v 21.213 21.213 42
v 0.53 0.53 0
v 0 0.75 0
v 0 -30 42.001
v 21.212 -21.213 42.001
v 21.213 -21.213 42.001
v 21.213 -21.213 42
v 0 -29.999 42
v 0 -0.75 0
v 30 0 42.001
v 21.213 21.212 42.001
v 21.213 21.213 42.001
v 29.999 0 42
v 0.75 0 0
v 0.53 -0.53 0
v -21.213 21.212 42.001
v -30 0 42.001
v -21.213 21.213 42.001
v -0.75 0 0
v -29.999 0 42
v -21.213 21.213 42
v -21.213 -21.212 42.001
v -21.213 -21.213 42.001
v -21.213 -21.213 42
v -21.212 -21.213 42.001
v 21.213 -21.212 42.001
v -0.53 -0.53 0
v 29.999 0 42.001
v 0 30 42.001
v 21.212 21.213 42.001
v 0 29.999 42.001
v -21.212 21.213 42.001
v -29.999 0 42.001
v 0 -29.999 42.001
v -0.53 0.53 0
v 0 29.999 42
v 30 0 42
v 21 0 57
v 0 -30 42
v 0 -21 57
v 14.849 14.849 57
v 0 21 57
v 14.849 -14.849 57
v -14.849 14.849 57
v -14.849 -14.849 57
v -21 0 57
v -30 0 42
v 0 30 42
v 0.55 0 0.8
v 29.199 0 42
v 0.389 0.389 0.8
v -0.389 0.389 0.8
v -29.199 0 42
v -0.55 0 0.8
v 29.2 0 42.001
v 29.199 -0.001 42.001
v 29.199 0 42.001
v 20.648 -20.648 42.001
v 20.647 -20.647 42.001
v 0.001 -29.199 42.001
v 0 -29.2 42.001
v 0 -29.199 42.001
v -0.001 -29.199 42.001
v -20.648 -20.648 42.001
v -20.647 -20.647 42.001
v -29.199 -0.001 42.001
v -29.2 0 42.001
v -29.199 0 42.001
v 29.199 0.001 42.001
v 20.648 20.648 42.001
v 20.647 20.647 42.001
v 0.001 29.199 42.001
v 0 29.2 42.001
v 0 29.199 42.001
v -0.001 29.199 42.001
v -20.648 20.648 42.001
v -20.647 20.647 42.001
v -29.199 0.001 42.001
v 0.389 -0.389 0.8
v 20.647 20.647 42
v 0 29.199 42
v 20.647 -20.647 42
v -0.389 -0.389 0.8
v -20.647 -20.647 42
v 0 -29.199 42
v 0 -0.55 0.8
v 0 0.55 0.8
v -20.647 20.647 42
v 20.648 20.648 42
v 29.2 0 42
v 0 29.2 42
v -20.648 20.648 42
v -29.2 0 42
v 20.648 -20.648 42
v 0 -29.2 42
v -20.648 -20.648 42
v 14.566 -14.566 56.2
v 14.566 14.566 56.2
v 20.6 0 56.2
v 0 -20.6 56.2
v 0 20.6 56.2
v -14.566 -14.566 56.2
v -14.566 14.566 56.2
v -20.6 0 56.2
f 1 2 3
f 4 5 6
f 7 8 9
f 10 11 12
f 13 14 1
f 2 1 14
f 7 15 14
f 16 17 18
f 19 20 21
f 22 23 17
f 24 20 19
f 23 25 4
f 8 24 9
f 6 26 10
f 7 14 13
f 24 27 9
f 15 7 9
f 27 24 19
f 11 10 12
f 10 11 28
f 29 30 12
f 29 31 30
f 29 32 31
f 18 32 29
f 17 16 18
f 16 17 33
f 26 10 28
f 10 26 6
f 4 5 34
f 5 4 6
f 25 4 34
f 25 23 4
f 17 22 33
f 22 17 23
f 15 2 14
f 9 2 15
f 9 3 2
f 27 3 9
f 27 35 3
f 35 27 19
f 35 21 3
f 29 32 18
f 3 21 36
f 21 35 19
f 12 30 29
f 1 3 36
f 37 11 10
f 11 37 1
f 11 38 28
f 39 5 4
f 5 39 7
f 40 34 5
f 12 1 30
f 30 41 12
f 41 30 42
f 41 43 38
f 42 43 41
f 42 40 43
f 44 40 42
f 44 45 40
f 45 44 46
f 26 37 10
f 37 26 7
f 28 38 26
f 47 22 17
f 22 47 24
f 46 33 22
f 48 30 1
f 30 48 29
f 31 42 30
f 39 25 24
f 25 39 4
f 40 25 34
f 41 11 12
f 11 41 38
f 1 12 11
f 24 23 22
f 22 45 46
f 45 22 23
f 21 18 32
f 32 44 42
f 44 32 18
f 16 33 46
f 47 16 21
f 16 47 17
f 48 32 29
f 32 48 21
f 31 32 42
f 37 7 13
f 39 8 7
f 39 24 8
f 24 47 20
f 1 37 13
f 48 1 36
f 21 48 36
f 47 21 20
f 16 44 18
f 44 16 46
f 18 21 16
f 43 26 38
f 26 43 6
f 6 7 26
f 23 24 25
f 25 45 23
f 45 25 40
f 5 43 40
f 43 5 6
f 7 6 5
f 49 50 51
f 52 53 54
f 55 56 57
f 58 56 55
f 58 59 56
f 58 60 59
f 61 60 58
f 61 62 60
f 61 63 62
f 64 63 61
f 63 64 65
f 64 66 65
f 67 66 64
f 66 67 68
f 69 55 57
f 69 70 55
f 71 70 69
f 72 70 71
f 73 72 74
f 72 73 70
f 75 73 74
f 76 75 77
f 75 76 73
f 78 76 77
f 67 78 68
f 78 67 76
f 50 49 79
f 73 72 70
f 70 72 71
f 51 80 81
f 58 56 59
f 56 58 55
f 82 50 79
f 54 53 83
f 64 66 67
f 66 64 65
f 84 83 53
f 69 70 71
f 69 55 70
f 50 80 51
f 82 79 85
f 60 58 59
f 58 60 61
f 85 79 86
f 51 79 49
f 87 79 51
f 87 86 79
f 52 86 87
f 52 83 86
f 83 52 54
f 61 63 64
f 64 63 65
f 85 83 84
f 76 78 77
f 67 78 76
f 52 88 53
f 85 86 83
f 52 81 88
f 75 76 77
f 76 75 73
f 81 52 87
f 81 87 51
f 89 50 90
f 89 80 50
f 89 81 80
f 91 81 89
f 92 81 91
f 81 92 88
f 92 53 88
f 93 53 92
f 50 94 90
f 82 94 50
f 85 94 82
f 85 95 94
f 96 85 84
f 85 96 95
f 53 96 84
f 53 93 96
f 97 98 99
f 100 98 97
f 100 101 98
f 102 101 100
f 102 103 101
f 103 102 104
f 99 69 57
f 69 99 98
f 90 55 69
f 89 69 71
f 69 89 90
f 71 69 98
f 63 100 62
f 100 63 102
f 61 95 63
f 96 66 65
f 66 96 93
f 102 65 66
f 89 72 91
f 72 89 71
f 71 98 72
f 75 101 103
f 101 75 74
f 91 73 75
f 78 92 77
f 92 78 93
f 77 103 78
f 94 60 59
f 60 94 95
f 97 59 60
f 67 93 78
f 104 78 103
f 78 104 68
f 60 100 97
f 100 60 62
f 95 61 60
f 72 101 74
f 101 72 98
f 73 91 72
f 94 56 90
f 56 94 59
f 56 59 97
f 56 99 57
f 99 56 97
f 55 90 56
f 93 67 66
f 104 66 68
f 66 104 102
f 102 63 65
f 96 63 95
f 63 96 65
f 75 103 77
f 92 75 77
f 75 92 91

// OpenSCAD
bigR=30;
smallR=bigR*0.7;

bottomH=bigR*1.4;
topH=bigR*0.5;

blunt=1;

tipR=0.75;

nozzleWidth=0.4;

diff=nozzleWidth*2;

hollowDiamond(bigR,smallR,tipR,bottomH,topH,diff);

// difference() {
//   hollowDiamond(bigR,smallR,tipR,bottomH,topH,diff);
//   translate([0,0,-500]) cube([1000,1000,1000]);
// }


module hollowDiamond(bigR,smallR,tipR,bottomH,topH,diff) {
  difference() {
    diamond(bigR,smallR,tipR,bottomH,topH);
    translate([0,0,diff]) diamond(bigR-diff,smallR-diff/2,tipR-diff/4,bottomH-diff,topH-diff);
  }
}



module diamond(bigR,smallR,tipR,bottomH,topH) {
  $fn=8;
  cylinder(r1=tipR,r2=bigR,h=bottomH+0.001);
  translate([0,0,bottomH]) cylinder(r1=bigR,r2=smallR,h=topH);
}
